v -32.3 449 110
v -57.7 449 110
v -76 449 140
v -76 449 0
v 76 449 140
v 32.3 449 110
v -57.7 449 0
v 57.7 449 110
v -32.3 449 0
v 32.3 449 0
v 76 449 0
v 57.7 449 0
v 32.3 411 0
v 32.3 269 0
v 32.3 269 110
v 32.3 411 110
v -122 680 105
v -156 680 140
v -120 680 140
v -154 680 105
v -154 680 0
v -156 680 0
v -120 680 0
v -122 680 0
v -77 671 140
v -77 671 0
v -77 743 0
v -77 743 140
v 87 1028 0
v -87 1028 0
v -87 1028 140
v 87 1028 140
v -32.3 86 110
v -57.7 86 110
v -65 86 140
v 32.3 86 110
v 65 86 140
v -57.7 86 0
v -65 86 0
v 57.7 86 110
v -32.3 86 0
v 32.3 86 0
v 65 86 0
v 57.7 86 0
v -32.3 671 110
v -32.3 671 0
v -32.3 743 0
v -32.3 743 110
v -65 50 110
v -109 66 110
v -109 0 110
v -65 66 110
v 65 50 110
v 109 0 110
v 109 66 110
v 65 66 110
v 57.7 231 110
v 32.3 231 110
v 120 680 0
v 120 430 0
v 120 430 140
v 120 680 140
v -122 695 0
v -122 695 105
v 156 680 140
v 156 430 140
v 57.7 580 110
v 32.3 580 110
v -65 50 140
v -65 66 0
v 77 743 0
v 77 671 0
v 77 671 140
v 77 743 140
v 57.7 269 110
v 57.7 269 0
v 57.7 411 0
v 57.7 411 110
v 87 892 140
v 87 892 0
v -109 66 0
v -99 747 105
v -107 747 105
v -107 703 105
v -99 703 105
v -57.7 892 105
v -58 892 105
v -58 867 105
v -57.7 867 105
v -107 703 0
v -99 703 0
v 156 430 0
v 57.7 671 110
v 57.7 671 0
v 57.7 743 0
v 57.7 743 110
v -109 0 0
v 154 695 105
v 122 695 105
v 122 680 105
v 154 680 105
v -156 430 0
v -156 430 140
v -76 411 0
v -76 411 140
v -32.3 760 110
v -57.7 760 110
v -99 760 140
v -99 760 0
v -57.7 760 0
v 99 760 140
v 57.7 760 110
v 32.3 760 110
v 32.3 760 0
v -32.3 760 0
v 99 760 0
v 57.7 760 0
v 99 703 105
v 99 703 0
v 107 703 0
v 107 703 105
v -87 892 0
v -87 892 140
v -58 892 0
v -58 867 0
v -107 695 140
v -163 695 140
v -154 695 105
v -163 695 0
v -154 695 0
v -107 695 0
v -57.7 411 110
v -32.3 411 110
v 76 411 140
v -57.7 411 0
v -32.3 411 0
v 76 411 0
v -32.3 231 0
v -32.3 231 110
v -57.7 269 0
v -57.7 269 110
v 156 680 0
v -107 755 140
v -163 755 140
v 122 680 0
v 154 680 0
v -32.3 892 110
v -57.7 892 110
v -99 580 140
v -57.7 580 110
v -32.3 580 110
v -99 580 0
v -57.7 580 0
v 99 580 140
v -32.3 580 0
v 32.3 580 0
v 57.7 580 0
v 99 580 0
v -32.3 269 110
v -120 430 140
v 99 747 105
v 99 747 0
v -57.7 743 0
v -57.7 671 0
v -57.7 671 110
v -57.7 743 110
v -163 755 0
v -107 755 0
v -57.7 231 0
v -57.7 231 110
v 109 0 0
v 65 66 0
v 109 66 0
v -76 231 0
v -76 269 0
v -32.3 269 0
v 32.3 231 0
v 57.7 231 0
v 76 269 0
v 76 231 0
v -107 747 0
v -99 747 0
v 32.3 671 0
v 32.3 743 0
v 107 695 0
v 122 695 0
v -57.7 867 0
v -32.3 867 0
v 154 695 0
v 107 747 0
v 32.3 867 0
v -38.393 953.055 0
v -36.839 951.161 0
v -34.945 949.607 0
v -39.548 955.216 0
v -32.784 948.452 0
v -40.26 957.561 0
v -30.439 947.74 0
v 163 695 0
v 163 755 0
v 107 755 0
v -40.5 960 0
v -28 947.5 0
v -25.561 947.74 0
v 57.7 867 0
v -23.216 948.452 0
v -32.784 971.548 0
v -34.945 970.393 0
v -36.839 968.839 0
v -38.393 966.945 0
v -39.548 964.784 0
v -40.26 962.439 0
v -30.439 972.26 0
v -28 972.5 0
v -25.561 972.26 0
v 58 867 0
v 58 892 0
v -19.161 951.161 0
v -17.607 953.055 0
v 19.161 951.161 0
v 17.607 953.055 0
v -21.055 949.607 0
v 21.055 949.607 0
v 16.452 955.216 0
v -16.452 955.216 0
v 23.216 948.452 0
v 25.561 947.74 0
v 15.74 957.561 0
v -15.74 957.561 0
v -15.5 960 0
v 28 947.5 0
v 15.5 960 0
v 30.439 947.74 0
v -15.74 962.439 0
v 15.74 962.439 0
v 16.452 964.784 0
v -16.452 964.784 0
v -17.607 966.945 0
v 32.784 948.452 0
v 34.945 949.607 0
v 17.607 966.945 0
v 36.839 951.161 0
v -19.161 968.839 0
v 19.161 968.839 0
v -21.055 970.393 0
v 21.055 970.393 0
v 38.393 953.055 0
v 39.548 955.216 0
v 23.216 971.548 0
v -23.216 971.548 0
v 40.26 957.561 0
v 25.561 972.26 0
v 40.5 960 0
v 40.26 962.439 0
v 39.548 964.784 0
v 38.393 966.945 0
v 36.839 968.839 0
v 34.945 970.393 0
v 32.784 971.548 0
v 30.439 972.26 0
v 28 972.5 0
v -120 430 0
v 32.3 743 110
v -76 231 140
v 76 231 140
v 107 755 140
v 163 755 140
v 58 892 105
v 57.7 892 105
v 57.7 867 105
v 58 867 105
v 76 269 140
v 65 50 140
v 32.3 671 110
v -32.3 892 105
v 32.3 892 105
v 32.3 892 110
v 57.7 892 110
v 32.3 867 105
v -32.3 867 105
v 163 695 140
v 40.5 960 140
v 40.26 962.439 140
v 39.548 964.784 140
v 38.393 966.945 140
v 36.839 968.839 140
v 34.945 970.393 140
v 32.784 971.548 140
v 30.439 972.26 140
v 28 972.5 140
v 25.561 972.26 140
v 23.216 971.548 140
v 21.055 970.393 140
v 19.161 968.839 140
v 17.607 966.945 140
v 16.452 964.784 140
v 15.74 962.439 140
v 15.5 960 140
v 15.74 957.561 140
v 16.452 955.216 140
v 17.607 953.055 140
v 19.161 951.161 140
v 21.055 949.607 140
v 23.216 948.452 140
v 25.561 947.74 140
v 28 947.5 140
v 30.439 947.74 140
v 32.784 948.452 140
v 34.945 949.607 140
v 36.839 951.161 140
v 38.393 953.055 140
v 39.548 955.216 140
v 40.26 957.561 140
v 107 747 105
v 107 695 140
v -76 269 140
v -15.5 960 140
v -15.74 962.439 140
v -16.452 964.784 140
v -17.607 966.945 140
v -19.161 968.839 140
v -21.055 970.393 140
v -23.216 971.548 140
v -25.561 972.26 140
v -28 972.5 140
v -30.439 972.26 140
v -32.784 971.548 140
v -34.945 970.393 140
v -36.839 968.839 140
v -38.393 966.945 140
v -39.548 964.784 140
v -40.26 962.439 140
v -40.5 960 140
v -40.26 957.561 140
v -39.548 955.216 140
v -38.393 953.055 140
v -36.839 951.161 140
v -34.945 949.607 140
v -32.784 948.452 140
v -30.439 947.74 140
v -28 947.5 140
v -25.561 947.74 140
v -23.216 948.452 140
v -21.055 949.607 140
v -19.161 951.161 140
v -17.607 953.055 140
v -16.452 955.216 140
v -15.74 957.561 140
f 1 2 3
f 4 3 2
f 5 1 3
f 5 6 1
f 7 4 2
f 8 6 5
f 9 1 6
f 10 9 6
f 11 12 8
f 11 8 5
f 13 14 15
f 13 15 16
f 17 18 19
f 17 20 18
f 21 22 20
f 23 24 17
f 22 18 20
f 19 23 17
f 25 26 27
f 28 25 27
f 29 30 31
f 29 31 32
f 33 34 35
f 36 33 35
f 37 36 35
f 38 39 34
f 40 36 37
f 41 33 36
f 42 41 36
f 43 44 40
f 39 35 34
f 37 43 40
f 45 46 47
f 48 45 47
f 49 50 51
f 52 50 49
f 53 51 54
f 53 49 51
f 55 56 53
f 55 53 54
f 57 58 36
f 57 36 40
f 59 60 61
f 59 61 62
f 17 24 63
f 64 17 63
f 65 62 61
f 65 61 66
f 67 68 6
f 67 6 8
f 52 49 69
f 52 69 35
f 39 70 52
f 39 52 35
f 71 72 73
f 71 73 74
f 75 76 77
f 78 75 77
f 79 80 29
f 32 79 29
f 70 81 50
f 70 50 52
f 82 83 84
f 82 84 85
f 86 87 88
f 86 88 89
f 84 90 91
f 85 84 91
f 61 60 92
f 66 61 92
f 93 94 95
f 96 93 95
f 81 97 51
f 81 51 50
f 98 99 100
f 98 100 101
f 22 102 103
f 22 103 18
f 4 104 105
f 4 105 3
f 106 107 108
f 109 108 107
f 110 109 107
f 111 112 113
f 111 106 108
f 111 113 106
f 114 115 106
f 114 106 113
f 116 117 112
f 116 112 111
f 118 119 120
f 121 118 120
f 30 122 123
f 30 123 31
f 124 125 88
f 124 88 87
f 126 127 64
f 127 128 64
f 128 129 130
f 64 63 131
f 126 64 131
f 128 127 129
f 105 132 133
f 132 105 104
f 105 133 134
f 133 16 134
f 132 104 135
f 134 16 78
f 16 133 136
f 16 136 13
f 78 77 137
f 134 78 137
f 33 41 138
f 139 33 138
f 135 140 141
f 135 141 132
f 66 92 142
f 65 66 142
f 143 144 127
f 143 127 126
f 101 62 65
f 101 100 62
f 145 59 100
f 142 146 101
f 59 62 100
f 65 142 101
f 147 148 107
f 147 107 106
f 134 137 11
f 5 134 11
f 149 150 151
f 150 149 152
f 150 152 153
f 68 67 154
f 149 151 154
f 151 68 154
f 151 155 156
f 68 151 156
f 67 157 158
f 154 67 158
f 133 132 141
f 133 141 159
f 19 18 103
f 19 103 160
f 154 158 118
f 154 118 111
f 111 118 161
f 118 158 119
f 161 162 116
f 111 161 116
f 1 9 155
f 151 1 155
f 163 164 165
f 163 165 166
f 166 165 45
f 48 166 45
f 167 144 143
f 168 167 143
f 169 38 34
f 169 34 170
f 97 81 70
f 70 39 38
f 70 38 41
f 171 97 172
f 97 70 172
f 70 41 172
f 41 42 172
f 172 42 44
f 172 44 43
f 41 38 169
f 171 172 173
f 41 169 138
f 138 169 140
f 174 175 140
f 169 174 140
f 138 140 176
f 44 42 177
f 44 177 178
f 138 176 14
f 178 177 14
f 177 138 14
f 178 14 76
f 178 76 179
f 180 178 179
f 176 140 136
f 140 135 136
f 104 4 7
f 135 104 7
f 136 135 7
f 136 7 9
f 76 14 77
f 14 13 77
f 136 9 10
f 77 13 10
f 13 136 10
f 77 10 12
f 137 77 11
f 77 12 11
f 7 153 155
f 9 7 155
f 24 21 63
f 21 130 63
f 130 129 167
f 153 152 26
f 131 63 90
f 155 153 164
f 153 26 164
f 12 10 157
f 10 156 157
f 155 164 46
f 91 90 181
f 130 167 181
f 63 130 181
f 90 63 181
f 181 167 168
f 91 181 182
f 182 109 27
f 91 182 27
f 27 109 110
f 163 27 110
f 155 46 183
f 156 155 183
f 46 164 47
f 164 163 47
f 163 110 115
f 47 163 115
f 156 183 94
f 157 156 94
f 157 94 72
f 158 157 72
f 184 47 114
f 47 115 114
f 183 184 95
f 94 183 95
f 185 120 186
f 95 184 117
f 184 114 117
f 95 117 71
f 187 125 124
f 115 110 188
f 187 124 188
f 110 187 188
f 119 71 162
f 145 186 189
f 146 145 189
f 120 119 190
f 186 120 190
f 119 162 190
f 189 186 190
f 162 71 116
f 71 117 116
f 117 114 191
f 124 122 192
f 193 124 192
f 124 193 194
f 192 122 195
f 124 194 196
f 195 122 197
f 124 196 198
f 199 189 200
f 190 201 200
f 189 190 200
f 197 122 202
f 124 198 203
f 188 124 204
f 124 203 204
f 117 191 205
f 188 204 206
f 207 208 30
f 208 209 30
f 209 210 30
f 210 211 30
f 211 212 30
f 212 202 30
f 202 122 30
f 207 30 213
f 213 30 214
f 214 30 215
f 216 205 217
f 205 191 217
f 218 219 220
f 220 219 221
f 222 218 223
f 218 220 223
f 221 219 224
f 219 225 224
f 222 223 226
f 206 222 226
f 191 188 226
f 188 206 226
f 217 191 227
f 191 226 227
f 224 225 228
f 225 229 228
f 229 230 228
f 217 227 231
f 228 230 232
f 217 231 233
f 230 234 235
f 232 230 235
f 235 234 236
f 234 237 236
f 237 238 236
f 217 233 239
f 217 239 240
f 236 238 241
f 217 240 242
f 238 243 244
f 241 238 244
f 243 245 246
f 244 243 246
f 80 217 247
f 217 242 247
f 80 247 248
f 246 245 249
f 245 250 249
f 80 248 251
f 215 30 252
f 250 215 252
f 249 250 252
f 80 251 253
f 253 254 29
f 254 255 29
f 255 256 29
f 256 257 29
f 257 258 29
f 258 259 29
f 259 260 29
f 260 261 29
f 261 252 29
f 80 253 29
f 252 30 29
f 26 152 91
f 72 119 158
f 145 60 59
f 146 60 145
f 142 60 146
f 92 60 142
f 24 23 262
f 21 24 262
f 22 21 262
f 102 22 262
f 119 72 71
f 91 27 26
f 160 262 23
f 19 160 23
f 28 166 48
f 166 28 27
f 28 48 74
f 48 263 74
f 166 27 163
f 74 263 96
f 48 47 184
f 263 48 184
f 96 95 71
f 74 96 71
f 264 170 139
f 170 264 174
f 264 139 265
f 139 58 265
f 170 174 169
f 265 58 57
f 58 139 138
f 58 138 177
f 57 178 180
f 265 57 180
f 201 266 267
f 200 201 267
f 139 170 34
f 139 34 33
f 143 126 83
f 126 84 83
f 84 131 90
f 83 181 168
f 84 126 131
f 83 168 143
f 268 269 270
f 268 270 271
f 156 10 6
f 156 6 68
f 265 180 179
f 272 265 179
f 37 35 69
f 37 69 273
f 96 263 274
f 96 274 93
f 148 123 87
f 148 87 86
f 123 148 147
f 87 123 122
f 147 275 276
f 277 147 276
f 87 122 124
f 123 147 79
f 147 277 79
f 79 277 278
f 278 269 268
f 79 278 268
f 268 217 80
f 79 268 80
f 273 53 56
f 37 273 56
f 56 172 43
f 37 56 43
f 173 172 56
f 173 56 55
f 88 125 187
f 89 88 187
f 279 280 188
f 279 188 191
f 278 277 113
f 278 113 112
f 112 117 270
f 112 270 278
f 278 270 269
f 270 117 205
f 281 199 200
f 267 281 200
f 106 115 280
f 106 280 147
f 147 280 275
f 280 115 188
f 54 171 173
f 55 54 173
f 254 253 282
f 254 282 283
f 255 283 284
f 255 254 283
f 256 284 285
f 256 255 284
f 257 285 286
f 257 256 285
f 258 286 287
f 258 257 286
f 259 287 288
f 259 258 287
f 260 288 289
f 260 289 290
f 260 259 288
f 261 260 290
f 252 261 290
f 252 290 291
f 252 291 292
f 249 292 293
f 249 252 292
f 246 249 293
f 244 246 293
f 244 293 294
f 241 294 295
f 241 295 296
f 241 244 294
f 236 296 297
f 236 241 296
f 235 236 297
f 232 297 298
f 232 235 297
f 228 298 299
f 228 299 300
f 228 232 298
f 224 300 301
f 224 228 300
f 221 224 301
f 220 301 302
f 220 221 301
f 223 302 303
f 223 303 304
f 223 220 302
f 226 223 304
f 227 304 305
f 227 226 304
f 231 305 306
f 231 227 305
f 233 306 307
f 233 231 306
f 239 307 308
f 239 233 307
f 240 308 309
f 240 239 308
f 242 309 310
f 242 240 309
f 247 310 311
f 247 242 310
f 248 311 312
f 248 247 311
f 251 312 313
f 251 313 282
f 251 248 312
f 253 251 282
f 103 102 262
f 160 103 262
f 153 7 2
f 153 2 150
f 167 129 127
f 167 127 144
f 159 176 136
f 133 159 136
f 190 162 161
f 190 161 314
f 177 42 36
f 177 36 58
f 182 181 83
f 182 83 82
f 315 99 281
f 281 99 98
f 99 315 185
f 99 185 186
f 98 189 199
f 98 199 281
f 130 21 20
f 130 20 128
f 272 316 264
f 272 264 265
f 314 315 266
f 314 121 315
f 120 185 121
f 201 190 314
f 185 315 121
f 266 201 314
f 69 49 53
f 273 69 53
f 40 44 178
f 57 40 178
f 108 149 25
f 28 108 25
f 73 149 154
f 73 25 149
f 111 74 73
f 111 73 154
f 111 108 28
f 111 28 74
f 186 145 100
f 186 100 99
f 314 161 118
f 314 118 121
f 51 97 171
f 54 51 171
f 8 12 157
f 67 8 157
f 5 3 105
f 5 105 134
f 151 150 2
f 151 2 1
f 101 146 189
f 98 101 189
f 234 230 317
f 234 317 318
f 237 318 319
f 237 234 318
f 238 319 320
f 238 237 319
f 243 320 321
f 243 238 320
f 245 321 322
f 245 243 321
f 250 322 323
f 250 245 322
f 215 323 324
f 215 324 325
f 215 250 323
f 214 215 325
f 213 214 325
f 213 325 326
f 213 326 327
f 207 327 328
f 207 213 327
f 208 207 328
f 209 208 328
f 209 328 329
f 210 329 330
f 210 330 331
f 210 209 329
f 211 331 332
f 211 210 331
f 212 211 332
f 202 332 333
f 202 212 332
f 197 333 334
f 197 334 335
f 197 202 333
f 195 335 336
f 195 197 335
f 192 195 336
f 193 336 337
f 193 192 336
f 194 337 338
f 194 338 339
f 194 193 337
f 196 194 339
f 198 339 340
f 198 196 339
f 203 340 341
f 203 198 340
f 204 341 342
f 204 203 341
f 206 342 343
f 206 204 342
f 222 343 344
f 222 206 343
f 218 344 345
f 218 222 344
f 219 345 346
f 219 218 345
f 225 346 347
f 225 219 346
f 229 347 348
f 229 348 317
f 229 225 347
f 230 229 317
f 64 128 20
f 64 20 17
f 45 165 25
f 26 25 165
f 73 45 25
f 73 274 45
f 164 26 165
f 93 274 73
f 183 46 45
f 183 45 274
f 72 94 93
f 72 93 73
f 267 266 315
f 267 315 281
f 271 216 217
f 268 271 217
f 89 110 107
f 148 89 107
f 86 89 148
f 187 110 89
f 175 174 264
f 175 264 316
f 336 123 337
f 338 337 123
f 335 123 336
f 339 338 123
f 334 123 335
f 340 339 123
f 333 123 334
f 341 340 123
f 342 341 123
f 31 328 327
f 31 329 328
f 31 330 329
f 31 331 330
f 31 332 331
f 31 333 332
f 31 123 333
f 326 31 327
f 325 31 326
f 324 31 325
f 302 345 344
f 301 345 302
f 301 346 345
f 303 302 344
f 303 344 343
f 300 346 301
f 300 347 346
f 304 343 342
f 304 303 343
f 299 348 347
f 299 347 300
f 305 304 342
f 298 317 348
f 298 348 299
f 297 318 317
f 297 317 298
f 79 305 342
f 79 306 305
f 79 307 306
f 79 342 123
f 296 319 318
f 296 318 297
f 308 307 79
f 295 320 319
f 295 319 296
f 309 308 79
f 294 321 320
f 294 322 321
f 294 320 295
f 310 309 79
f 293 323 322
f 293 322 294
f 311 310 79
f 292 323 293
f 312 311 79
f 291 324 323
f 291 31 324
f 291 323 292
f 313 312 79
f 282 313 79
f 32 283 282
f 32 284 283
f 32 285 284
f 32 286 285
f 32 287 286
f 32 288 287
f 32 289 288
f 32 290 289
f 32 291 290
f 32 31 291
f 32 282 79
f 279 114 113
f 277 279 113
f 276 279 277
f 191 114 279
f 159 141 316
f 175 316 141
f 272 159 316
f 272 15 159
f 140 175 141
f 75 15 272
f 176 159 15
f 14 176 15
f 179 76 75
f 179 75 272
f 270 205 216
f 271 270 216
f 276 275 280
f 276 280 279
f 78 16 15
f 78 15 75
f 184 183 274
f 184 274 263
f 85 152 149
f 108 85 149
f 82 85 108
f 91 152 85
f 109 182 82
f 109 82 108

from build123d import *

# Parameters (mm, degrees)
SKETCH1_W             = 218
SKETCH1_H             = 66
BOSS_EXTRUDE1_DEPTH   = 110
SKETCH1_W_2           = 25.4
SKETCH1_H_2           = 820
BOSS_EXTRUDE1_2_DEPTH = 110
BOSS_EXTRUDE1_3_DEPTH = 110
SKETCH2_W             = 130
SKETCH2_H             = 36
SKETCH2_W_2           = 152
SKETCH2_H_2           = 38
SKETCH2_W_3           = 198
SKETCH2_H_3           = 180
SKETCH2_W_4           = 154
SKETCH2_H_4           = 72
SKETCH2_W_5           = 56
SKETCH2_H_5           = 60
SKETCH2_W_6           = 36
SKETCH2_H_6           = 250
SKETCH2_W_7           = 174
SKETCH2_H_7           = 136
SKETCH2_R             = 12.5
BOSS_EXTRUDE2_DEPTH   = 140
SKETCH3_W             = 24
SKETCH3_H             = 44
SKETCH3_W_2           = 32
SKETCH3_H_2           = 30
SKETCH3_W_3           = 116
SKETCH3_H_3           = 36
BOSS_EXTRUDE3_DEPTH   = 105


with BuildPart() as part:
    # Sketch1 → Boss-Extrude1 (new body)
    with BuildSketch(Plane.XY):
        with Locations((0, 33)):
            Rectangle(SKETCH1_W, SKETCH1_H)
    extrude(amount=BOSS_EXTRUDE1_DEPTH)



with BuildPart() as body_2:
    # Sketch1 → Boss-Extrude1 2 (new body)
    with BuildSketch(Plane.XY):
        with Locations((-45, 485)):
            Rectangle(SKETCH1_W_2, SKETCH1_H_2)
    extrude(amount=BOSS_EXTRUDE1_2_DEPTH)


with BuildPart() as body_3:
    # Sketch1 → Boss-Extrude1 3 (new body)
    with BuildSketch(Plane.XY):
        with Locations((45, 485)):
            Rectangle(SKETCH1_W_2, SKETCH1_H_2)
    extrude(amount=BOSS_EXTRUDE1_3_DEPTH)


with BuildPart() as part_1:
    add(part.part)

    add(body_2.part)  # Boss-Extrude2 merges body 2

    add(body_3.part)  # Boss-Extrude2 merges body 3
    # Sketch2 → Boss-Extrude2 (add)
    # profile 1 of 9: a face of its own
    with BuildSketch(Plane.XY):
        with Locations((0, 68)):
            Rectangle(SKETCH2_W, SKETCH2_H)
    # profile 2 of 9: a face of its own
    with BuildSketch(Plane.XY):
        with Locations((0, 250)):
            Rectangle(SKETCH2_W_2, SKETCH2_H_2)
    # profile 3 of 9: a face of its own
    with BuildSketch(Plane.XY):
        with Locations((0, 430)):
            Rectangle(SKETCH2_W_2, SKETCH2_H_2)
    # profile 4 of 9: a face of its own
    with BuildSketch(Plane.XY):
        with Locations((0, 670)):
            Rectangle(SKETCH2_W_3, SKETCH2_H_3)
        with Locations((0, 707)):
            Rectangle(SKETCH2_W_4, SKETCH2_H_4, mode=Mode.SUBTRACT)
    # profile 5 of 9: a face of its own
    with BuildSketch(Plane.XY):
        with Locations((-135, 725)):
            Rectangle(SKETCH2_W_5, SKETCH2_H_5)
    # profile 6 of 9: a face of its own
    with BuildSketch(Plane.XY):
        with Locations((135, 725)):
            Rectangle(SKETCH2_W_5, SKETCH2_H_5)
    # profile 7 of 9: a face of its own
    with BuildSketch(Plane.XY):
        with Locations((-138, 555)):
            Rectangle(SKETCH2_W_6, SKETCH2_H_6)
    # profile 8 of 9: a face of its own
    with BuildSketch(Plane.XY):
        with Locations((138, 555)):
            Rectangle(SKETCH2_W_6, SKETCH2_H_6)
    # profile 9 of 9: a face of its own
    with BuildSketch(Plane.XY):
        with Locations((0, 960)):
            Rectangle(SKETCH2_W_7, SKETCH2_H_7)
        with Locations((-28, 960)):
            Circle(SKETCH2_R, mode=Mode.SUBTRACT)
        with Locations((28, 960)):
            Circle(SKETCH2_R, mode=Mode.SUBTRACT)
    extrude(amount=BOSS_EXTRUDE2_DEPTH)

    # Sketch3 → Boss-Extrude3 (add)
    with BuildSketch(Plane.XY):
        with Locations((-103, 725)):
            Rectangle(SKETCH3_W, SKETCH3_H)
        with Locations((103, 725)):
            Rectangle(SKETCH3_W, SKETCH3_H)
        with Locations((-138, 688)):
            Rectangle(SKETCH3_W_2, SKETCH3_H_2)
        with Locations((138, 688)):
            Rectangle(SKETCH3_W_2, SKETCH3_H_2)
        with Locations((0, 885)):
            Rectangle(SKETCH3_W_3, SKETCH3_H_3)
    extrude(amount=BOSS_EXTRUDE3_DEPTH)


solid = part_1.part
